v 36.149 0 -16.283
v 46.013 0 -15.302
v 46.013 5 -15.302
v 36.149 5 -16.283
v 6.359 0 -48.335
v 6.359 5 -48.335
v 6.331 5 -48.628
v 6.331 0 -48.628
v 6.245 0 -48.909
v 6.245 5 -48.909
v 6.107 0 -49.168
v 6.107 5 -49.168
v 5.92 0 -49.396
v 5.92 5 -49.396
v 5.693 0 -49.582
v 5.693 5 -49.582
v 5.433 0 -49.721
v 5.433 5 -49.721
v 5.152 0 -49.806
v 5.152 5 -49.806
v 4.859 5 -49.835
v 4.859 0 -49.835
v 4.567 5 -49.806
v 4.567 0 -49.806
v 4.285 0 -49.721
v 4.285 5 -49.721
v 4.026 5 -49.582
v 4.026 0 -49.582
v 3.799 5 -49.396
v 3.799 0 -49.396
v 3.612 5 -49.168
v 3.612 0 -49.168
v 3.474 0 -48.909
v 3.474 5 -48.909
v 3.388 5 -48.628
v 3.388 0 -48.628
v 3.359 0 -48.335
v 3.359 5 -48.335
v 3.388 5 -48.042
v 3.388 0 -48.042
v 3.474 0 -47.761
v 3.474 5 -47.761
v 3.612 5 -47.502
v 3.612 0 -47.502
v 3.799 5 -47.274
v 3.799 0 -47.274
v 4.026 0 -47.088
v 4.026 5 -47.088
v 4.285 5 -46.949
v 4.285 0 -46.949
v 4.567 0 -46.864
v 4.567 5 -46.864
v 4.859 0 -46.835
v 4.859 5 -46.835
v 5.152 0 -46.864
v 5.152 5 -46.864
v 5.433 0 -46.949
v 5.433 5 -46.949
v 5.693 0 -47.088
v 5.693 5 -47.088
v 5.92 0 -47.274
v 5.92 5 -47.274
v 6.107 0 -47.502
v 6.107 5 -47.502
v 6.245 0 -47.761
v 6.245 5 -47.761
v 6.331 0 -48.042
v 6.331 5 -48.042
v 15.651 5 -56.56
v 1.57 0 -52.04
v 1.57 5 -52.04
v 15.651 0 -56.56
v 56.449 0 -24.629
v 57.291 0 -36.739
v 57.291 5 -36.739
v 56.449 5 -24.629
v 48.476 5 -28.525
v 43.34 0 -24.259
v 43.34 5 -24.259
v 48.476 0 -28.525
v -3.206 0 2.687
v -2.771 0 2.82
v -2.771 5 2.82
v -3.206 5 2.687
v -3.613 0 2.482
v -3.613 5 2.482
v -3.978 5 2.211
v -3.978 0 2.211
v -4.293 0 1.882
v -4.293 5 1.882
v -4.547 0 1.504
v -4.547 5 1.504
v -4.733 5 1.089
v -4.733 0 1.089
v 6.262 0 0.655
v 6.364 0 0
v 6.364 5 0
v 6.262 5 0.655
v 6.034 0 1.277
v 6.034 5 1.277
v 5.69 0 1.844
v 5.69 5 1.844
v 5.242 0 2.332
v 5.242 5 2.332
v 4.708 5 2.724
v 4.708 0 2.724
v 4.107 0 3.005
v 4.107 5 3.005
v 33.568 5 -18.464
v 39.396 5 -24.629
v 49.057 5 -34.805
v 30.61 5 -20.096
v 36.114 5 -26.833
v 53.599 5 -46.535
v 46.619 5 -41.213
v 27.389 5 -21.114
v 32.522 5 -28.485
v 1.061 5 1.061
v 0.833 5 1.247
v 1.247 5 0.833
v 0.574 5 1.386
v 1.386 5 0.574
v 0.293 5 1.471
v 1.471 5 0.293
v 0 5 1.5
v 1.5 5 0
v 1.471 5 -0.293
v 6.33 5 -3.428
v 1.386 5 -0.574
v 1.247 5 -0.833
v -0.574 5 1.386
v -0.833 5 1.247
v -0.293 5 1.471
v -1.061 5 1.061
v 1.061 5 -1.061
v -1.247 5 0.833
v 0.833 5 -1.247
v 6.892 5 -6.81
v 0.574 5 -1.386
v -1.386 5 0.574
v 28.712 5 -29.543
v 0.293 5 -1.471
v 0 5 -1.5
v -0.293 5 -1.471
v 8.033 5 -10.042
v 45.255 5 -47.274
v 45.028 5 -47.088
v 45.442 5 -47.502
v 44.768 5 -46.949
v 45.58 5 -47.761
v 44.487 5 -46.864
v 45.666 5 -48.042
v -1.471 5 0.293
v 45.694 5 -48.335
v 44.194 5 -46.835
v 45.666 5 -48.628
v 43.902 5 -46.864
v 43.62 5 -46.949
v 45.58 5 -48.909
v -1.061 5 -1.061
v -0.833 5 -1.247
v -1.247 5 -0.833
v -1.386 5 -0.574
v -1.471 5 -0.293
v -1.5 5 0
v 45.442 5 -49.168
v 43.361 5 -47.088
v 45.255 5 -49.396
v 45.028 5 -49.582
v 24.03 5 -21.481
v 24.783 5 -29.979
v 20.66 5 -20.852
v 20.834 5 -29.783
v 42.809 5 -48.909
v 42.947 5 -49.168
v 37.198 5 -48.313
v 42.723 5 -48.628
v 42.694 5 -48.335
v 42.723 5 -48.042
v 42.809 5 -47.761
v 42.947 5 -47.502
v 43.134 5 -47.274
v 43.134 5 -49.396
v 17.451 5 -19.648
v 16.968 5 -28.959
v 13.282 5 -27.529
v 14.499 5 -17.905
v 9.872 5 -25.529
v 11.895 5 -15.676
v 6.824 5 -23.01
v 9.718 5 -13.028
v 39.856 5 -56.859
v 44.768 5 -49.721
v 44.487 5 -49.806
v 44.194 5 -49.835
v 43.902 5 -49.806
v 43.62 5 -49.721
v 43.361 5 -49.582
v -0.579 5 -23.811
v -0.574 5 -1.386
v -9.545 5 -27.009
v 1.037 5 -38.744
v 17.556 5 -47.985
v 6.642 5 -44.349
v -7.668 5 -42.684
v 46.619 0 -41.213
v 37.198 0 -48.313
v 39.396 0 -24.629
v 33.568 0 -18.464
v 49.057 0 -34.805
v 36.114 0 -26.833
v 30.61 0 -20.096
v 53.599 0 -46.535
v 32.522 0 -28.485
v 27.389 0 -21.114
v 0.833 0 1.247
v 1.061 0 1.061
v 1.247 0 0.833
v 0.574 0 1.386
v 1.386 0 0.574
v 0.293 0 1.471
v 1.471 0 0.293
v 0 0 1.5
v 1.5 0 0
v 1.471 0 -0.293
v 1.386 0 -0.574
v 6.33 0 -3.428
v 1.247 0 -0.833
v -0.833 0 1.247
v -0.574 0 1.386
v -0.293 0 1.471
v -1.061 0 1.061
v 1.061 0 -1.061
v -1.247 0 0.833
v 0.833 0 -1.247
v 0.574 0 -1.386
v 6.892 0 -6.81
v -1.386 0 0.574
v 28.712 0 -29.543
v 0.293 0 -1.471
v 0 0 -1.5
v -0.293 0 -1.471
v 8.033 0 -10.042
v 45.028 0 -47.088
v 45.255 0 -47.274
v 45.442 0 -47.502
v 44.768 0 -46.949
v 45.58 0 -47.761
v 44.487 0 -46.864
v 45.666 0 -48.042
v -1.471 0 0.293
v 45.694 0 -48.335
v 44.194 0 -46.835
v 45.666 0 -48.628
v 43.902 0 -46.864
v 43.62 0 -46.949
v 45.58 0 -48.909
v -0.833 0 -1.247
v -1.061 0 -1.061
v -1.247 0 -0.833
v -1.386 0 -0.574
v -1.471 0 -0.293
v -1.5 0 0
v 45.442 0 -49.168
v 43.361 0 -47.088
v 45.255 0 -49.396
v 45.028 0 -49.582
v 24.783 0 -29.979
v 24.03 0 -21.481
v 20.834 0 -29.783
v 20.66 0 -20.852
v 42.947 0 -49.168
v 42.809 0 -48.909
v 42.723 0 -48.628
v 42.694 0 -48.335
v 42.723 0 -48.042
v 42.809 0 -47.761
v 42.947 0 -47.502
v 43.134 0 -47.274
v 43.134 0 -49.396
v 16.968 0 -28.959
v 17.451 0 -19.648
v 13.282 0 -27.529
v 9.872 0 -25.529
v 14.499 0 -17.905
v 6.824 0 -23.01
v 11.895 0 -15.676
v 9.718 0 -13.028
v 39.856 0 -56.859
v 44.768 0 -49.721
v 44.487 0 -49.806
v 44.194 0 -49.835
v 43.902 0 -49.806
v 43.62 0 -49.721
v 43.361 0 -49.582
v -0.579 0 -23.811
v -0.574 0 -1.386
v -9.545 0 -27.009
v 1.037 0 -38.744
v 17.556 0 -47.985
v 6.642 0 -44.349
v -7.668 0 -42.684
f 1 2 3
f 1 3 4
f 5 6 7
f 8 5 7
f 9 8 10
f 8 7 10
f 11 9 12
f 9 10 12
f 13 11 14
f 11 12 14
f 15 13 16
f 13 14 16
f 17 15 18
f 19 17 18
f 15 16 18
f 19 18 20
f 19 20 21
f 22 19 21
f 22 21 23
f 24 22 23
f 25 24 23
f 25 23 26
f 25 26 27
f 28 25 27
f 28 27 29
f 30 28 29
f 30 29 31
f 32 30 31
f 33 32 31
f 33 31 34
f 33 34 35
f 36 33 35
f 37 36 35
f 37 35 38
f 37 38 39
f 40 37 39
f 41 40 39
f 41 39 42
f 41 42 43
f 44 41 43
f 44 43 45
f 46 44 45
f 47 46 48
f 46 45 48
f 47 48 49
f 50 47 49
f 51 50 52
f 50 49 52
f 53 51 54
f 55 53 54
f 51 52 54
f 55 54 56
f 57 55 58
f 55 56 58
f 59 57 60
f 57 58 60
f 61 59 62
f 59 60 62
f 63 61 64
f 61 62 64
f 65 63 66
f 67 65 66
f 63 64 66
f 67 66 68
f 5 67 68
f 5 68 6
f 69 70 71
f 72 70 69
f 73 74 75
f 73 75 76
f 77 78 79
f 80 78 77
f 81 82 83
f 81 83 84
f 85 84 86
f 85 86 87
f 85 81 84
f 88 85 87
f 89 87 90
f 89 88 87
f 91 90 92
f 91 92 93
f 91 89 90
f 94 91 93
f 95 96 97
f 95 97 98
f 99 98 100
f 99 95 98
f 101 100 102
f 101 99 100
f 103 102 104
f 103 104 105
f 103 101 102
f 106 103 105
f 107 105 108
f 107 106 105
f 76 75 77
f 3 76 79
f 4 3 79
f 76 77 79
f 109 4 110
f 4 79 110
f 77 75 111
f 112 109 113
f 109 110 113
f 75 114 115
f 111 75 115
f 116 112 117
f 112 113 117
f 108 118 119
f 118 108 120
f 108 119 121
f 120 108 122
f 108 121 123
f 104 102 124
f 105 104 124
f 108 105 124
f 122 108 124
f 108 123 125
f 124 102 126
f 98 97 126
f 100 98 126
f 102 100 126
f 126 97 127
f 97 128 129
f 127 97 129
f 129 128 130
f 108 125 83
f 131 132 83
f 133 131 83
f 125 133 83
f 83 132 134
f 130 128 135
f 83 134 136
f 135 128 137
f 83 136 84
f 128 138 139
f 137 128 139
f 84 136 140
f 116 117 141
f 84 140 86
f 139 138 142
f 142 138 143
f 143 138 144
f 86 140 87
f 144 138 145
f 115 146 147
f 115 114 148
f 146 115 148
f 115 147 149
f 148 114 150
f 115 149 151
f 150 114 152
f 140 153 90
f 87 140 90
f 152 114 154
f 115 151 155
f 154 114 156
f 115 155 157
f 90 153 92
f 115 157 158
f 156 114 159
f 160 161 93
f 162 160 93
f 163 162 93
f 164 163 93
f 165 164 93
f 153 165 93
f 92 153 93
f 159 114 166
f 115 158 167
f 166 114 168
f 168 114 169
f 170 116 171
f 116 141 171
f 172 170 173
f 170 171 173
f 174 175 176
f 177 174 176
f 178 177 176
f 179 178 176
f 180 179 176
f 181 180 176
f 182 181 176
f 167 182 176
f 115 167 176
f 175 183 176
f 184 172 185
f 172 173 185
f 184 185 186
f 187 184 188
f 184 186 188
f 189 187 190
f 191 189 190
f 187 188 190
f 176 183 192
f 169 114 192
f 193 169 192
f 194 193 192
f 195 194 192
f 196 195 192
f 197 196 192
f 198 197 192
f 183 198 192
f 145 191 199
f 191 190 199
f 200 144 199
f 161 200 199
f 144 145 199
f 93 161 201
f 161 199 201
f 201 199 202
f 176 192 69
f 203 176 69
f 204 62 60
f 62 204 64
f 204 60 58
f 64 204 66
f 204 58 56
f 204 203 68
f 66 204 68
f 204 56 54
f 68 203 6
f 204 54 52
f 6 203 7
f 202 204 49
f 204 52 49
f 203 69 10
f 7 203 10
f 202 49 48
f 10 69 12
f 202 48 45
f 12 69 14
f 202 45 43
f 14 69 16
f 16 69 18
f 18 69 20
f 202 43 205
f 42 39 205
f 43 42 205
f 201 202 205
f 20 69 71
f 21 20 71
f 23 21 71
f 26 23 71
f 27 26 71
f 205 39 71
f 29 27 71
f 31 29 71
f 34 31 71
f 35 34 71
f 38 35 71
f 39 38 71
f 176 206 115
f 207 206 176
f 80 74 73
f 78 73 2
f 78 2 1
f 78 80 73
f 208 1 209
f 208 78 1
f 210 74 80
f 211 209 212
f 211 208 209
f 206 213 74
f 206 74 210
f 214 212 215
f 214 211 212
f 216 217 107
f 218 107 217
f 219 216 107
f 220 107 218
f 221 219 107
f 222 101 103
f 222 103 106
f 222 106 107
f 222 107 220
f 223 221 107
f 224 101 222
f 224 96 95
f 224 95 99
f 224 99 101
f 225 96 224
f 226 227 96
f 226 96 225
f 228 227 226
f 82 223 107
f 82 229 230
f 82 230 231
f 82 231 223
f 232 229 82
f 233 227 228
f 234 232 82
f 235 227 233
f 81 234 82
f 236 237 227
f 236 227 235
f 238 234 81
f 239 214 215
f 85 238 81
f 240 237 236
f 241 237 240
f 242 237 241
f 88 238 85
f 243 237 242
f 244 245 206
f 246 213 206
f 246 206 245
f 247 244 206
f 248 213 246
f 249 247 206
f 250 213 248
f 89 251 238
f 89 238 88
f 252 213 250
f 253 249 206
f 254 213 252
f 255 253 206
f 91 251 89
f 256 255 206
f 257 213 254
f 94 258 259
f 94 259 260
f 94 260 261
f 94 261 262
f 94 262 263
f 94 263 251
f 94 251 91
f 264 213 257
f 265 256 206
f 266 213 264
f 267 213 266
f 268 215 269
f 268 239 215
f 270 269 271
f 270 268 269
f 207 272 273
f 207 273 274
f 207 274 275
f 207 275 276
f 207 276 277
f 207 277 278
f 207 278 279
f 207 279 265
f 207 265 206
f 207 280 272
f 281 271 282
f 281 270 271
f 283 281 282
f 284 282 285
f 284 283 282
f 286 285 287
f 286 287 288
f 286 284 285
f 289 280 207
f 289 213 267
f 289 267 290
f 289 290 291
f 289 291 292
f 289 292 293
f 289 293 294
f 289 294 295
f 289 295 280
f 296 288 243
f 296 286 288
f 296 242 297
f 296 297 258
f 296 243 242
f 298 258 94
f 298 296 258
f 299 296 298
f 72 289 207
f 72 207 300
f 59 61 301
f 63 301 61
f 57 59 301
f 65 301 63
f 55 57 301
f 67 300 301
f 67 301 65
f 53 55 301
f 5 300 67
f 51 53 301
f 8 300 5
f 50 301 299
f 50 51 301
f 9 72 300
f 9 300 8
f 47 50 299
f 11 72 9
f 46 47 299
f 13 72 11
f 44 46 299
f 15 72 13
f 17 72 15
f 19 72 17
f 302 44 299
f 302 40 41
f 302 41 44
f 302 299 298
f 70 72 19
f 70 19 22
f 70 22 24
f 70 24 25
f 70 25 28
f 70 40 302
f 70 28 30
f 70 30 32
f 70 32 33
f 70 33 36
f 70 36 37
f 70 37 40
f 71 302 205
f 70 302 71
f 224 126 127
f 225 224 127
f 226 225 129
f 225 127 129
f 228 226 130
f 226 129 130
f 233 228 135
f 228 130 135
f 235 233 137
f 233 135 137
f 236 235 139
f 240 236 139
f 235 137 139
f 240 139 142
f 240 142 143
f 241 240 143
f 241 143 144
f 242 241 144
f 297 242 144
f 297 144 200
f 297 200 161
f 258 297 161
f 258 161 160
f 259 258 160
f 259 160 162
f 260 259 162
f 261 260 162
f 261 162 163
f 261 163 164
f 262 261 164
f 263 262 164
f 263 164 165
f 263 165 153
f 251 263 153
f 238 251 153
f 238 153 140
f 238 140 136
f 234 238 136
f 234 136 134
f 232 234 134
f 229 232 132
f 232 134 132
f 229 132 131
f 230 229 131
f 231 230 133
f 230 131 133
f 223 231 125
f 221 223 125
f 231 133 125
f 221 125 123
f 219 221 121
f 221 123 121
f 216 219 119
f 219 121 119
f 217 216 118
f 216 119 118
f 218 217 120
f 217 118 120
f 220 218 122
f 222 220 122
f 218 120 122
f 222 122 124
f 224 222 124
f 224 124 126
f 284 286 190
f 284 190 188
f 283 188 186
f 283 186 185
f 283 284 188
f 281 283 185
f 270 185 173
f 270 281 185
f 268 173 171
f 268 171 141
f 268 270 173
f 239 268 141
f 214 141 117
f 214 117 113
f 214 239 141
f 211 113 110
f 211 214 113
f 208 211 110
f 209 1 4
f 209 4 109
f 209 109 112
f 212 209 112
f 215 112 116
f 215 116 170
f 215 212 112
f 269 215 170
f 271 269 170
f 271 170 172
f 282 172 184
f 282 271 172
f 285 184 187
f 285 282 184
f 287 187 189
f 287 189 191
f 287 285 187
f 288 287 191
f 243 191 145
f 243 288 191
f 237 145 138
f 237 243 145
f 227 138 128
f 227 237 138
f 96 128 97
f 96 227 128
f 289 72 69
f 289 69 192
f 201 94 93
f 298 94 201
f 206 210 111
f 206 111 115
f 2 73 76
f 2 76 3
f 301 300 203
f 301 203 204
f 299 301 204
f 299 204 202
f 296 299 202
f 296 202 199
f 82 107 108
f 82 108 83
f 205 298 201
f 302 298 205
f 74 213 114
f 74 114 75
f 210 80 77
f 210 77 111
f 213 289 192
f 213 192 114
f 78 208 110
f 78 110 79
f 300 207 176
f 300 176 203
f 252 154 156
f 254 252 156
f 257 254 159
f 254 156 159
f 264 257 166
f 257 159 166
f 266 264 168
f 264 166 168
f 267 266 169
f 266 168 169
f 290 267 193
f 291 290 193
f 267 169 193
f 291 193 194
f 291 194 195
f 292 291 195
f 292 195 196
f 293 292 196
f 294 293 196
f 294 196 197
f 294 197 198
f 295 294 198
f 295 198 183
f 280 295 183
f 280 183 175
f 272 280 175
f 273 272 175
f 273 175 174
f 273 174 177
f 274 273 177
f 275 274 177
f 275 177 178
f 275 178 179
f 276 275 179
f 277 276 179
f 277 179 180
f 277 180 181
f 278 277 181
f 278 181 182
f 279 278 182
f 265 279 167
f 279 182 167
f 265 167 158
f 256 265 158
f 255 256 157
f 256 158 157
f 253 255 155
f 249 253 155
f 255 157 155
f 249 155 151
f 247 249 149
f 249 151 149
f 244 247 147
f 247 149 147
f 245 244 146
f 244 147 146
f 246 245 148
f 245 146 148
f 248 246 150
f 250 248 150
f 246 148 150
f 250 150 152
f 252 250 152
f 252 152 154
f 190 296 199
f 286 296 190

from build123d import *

# Parameters (mm, degrees)
BOSS_EXTRUDE2_DEPTH = 5
SKETCH2_R           = 1.5
CUT_EXTRUDE1_DEPTH  = 15


with BuildPart() as part:
    # Sketch1 → Boss-Extrude2 (new body)
    with BuildSketch(Plane(origin=(0, 0, 0), x_dir=(1, 0, 0), z_dir=(0, 1, 0))):
        with BuildLine():
            Line((1.569728042, 52.040332943), (15.651301799, 56.559771658))
            Line((15.651301799, 56.559771658), (39.856221019, 56.858644564))
            Line((39.856221019, 56.858644564), (53.599377939, 46.535137731))
            Line((53.599377939, 46.535137731), (57.29105631, 36.738583337))
            Line((57.29105631, 36.738583337), (56.448543902, 24.628756692))
            Line((56.448543902, 24.628756692), (46.012568554, 15.301947443))
            Line((46.012568554, 15.301947443), (36.148543795, 16.282769063))
            ThreePointArc((36.148543795, 16.282769063), (30.610071526, 20.095537749), (24.030369651, 21.480963085))
            ThreePointArc((24.030369651, 21.480963085), (10.748506444, 14.399234116), (6.364349479, 0))
            ThreePointArc((6.364349479, 0), (5.689983794, -1.843684392), (4.107122834, -3.004930446))
            Line((4.107122834, -3.004930446), (-2.771373889, -2.820272816))
            ThreePointArc((-2.771373889, -2.820272816), (-3.97819548, -2.210628496), (-4.733361209, -1.089107533))
            Line((-4.733361209, -1.089107533), (-9.544633948, 27.008719122))
            Line((-9.544633948, 27.008719122), (-7.668325905, 42.684434119))
            Line((-7.668325905, 42.684434119), (1.569728042, 52.040332943))
        make_face()
        with BuildLine():
            Line((1.036932163, 38.743694932), (-0.578535299, 23.81135118))
            Line((-0.578535299, 23.81135118), (6.824389086, 23.010459929))
            ThreePointArc((6.824389086, 23.010459929), (22.804886304, 29.960497456), (39.395602183, 24.628756692))
            Line((39.395602183, 24.628756692), (43.340115732, 24.258511233))
            Line((43.340115732, 24.258511233), (48.476214586, 28.525175745))
            Line((48.476214586, 28.525175745), (49.056861781, 34.804762264))
            Line((49.056861781, 34.804762264), (46.61935743, 41.212721012))
            Line((46.61935743, 41.212721012), (37.197706882, 48.312593262))
            Line((37.197706882, 48.312593262), (17.555979737, 47.985159309))
            Line((17.555979737, 47.985159309), (6.642360366, 44.349123135))
            Line((6.642360366, 44.349123135), (1.036932163, 38.743694932))
        make_face(mode=Mode.SUBTRACT)
    extrude(amount=BOSS_EXTRUDE2_DEPTH)

    # Sketch2 → Cut-Extrude1 (cut)
    with BuildSketch(Plane(origin=(0, 5, 0), x_dir=(1, 0, 0), z_dir=(0, 1, 0))):
        with Locations((44.194472597, 48.335123533)):
            Circle(SKETCH2_R)
        Circle(SKETCH2_R)
        with Locations((4.859386625, 48.335123533)):
            Circle(SKETCH2_R)
    extrude(amount=-CUT_EXTRUDE1_DEPTH, mode=Mode.SUBTRACT)


solid = part.part
